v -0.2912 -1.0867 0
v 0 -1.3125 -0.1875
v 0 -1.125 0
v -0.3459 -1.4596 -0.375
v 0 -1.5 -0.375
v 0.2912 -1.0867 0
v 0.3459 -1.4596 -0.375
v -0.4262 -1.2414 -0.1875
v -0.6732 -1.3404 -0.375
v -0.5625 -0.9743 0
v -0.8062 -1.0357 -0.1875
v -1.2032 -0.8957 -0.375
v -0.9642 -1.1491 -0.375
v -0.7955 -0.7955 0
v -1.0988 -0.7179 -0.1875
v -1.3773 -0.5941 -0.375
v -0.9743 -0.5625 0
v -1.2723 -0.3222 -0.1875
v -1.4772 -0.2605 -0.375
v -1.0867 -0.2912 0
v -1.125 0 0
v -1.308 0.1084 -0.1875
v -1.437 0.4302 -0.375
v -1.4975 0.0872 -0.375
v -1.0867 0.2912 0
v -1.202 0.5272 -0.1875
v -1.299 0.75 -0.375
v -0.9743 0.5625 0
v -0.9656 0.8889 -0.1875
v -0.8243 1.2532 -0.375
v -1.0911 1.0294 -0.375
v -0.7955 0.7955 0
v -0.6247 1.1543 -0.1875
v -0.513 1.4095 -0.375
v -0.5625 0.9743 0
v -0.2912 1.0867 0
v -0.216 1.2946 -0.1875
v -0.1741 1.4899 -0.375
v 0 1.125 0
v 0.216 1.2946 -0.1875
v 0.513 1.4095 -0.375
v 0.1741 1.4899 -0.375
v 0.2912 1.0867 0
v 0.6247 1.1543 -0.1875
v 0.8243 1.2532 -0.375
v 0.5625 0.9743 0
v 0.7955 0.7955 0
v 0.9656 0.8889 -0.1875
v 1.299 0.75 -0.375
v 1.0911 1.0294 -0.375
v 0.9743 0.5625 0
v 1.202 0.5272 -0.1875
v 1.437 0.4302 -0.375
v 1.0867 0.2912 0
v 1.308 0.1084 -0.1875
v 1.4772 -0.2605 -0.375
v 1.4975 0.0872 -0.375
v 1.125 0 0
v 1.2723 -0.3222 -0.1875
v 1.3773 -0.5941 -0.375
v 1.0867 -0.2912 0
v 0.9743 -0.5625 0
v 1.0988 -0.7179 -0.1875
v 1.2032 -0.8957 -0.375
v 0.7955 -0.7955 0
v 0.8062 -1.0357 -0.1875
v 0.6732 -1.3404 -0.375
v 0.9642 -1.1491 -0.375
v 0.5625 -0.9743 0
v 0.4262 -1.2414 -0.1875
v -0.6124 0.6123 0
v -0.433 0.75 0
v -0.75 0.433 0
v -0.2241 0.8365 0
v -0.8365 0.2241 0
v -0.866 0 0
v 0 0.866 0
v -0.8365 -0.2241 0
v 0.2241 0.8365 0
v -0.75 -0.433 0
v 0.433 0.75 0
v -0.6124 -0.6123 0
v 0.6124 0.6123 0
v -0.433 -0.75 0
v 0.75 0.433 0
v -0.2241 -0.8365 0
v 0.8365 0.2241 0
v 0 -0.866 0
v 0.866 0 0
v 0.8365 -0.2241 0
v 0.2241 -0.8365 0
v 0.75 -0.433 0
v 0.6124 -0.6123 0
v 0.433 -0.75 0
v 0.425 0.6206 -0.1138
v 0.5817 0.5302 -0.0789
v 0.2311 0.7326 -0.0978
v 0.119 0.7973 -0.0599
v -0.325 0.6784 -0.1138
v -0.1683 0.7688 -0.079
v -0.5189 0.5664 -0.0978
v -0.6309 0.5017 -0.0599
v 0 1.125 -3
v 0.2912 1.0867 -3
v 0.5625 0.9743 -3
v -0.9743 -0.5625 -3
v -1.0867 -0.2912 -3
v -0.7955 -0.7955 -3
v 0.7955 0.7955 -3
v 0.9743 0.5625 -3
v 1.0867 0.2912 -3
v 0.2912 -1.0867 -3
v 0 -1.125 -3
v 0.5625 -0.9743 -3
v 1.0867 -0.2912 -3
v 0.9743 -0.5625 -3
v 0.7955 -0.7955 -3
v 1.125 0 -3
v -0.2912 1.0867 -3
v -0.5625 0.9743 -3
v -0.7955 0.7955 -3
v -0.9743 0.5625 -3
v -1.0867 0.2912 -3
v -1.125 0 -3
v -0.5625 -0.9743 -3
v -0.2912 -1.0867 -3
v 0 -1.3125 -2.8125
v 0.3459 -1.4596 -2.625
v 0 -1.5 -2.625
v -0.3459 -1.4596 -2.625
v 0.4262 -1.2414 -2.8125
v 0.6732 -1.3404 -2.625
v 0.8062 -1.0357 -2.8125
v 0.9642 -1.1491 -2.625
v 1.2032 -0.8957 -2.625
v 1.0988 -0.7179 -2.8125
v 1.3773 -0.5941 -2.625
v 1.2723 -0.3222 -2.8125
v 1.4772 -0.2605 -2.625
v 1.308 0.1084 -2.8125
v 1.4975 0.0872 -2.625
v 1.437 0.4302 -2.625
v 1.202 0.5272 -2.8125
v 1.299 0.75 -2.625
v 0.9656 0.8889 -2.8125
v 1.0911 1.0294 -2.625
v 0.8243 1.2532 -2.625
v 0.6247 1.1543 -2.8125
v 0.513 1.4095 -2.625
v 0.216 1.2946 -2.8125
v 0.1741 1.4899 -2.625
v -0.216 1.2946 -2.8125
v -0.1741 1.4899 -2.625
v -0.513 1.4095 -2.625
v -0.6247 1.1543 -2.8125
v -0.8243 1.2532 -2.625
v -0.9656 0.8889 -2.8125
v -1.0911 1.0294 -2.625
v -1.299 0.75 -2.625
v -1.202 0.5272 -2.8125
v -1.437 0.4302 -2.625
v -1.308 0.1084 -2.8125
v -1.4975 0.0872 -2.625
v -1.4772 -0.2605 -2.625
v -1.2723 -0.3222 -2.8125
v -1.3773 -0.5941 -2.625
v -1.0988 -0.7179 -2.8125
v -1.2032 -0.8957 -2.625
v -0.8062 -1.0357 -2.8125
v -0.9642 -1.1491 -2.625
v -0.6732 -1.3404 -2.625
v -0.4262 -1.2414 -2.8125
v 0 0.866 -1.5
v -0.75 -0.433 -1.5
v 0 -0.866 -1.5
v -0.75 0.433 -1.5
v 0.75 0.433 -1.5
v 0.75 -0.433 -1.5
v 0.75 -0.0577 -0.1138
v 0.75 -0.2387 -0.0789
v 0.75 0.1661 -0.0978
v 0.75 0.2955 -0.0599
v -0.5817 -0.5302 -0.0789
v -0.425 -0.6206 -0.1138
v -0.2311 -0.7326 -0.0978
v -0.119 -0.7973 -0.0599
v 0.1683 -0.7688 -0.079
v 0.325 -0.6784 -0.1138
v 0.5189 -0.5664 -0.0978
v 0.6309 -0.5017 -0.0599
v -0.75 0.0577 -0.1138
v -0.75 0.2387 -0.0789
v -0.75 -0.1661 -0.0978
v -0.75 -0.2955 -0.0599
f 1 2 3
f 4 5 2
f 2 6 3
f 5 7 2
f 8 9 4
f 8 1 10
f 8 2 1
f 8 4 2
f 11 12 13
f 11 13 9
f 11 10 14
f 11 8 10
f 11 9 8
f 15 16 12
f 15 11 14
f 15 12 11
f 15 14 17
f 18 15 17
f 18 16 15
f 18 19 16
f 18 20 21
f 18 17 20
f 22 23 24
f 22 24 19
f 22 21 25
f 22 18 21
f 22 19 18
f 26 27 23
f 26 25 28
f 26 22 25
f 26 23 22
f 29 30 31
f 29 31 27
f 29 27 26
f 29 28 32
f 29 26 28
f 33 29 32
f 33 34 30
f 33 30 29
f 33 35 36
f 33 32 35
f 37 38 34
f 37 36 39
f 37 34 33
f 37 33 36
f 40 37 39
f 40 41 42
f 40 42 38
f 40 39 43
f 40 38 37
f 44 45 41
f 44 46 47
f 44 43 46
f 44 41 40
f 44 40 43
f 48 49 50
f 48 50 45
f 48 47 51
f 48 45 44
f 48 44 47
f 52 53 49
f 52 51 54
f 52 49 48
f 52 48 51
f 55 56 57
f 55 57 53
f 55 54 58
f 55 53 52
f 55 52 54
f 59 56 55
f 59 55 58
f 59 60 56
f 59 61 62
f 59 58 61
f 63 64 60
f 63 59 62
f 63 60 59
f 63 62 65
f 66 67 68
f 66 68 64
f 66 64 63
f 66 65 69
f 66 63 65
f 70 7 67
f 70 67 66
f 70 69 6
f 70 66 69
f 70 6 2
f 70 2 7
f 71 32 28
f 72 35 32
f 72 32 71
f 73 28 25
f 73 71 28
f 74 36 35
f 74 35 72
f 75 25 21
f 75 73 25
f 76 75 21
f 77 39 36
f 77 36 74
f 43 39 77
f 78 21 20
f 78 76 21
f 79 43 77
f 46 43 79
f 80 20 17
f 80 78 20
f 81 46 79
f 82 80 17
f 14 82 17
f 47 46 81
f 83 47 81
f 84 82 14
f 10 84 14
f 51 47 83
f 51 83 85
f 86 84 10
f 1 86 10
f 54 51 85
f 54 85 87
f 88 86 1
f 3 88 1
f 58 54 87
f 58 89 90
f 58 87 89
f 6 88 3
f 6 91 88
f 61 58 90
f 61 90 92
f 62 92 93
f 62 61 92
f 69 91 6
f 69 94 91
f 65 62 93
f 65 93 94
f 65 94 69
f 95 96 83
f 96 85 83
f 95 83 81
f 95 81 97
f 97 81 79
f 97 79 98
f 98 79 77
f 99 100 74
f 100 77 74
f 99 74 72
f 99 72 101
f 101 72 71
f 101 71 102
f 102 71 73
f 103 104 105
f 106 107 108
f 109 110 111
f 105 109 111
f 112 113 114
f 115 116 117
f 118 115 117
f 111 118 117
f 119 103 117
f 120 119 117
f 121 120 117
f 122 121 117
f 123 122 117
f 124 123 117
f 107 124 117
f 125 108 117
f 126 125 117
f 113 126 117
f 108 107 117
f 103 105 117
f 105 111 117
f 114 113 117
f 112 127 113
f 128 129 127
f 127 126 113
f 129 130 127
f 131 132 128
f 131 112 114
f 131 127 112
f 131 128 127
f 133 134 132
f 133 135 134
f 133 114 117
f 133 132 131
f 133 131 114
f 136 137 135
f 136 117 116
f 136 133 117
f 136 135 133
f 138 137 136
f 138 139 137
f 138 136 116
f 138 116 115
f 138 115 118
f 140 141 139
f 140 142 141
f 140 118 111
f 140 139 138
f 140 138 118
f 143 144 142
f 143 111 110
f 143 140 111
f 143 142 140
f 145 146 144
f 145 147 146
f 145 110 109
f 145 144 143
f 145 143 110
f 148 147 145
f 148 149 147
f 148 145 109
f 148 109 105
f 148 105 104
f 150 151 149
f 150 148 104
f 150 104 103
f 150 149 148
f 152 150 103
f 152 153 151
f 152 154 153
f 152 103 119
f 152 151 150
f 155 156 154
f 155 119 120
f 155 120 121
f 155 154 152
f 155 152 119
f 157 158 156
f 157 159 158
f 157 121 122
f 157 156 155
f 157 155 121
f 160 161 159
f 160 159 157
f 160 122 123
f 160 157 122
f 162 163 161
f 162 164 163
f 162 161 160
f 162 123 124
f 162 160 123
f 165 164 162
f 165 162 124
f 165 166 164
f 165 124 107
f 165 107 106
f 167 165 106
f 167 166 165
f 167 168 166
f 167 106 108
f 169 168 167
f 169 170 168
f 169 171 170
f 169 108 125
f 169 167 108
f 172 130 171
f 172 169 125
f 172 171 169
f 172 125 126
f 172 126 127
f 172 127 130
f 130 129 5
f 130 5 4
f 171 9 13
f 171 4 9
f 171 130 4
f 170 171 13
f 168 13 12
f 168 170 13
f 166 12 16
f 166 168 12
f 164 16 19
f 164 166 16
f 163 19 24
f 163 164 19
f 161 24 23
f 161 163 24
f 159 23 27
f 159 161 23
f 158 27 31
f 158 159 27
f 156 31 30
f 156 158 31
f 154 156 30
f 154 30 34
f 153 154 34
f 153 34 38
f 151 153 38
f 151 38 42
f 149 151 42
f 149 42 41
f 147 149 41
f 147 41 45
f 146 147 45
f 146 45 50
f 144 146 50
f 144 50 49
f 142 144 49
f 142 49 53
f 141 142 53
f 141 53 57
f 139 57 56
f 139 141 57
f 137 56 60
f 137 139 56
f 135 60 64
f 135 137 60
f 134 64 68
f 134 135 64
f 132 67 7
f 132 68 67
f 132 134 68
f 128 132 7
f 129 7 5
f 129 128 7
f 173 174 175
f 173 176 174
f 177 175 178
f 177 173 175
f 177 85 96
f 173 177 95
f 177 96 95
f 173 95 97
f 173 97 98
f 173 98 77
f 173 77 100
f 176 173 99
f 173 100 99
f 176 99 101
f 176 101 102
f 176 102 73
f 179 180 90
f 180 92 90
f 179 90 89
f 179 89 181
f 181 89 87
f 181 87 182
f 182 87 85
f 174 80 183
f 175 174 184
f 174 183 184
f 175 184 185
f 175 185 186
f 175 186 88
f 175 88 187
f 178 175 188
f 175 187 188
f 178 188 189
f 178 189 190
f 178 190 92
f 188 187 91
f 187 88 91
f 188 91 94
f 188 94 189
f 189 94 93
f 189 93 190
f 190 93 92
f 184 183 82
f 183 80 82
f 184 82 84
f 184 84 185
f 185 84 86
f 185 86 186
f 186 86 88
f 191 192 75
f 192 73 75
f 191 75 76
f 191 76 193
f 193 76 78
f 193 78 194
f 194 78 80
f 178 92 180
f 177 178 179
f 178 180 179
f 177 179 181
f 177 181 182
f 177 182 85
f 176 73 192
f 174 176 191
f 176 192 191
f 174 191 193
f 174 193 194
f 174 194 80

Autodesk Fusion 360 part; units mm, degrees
sketch "Sketch2" plane through (0, 0, 0) normal (1, 0, 0) x (0, 1, 0)
  line L0 (-1.5, -2.625) -> (-1.125, -3)
  line L1 (-1.125, -3) -> (0, -3)
  line L2 (0, -3) -> (0, 0)
  line L3 (-1.5, -0.375) -> (-1.5, -2.625)
  line L4 (0, 0) -> (-1.125, 0)
  line L5 (-0.866, 0) -> (0, -0.866)
  line L6 (-1.125, 0) -> (-1.5, -0.375)
  point P0 (-1.75, 2)
  point P1 (-1.5, 0)
  dimension "d24" = 1.5
  dimension "d25" = 45
  dimension "d26" = 0.375
  dimension "d36" = 3
  dimension "d37" = 45
  dimension "d38" = 0.866
  dimension "d42" = 0.375
revolve "Revolve1" add sketch "Sketch2" angle 360 about axis through (0, 0, -3) along (0, 0, 1) contours L0 L1 L2 L3 L4 L5 L6
sketch "Sketch3" plane through (0, 0, 0) normal (0, 0, 1) x (1, 0, 0)
  line L0 (0.75, 0.433) -> (0, 0.866)
  line L1 (0, 0.866) -> (-0.75, 0.433)
  line L2 (-0.75, 0.433) -> (-0.75, -0.433)
  line L3 (-0.75, -0.433) -> (0, -0.866)
  line L4 (0, -0.866) -> (0.75, -0.433)
  line L5 (0.75, -0.433) -> (0.75, 0.433)
  dimension "d31" = 0.75
extrude "Extrude4" cut sketch "Sketch3" against normal blind 1.5
equation "Length = 3 mm"
equation "d36 = Length"
equation "d38 = 1.732 mm / 2"
equation "d42 = d26"
properties part number "M3x4mm Setscrew"
